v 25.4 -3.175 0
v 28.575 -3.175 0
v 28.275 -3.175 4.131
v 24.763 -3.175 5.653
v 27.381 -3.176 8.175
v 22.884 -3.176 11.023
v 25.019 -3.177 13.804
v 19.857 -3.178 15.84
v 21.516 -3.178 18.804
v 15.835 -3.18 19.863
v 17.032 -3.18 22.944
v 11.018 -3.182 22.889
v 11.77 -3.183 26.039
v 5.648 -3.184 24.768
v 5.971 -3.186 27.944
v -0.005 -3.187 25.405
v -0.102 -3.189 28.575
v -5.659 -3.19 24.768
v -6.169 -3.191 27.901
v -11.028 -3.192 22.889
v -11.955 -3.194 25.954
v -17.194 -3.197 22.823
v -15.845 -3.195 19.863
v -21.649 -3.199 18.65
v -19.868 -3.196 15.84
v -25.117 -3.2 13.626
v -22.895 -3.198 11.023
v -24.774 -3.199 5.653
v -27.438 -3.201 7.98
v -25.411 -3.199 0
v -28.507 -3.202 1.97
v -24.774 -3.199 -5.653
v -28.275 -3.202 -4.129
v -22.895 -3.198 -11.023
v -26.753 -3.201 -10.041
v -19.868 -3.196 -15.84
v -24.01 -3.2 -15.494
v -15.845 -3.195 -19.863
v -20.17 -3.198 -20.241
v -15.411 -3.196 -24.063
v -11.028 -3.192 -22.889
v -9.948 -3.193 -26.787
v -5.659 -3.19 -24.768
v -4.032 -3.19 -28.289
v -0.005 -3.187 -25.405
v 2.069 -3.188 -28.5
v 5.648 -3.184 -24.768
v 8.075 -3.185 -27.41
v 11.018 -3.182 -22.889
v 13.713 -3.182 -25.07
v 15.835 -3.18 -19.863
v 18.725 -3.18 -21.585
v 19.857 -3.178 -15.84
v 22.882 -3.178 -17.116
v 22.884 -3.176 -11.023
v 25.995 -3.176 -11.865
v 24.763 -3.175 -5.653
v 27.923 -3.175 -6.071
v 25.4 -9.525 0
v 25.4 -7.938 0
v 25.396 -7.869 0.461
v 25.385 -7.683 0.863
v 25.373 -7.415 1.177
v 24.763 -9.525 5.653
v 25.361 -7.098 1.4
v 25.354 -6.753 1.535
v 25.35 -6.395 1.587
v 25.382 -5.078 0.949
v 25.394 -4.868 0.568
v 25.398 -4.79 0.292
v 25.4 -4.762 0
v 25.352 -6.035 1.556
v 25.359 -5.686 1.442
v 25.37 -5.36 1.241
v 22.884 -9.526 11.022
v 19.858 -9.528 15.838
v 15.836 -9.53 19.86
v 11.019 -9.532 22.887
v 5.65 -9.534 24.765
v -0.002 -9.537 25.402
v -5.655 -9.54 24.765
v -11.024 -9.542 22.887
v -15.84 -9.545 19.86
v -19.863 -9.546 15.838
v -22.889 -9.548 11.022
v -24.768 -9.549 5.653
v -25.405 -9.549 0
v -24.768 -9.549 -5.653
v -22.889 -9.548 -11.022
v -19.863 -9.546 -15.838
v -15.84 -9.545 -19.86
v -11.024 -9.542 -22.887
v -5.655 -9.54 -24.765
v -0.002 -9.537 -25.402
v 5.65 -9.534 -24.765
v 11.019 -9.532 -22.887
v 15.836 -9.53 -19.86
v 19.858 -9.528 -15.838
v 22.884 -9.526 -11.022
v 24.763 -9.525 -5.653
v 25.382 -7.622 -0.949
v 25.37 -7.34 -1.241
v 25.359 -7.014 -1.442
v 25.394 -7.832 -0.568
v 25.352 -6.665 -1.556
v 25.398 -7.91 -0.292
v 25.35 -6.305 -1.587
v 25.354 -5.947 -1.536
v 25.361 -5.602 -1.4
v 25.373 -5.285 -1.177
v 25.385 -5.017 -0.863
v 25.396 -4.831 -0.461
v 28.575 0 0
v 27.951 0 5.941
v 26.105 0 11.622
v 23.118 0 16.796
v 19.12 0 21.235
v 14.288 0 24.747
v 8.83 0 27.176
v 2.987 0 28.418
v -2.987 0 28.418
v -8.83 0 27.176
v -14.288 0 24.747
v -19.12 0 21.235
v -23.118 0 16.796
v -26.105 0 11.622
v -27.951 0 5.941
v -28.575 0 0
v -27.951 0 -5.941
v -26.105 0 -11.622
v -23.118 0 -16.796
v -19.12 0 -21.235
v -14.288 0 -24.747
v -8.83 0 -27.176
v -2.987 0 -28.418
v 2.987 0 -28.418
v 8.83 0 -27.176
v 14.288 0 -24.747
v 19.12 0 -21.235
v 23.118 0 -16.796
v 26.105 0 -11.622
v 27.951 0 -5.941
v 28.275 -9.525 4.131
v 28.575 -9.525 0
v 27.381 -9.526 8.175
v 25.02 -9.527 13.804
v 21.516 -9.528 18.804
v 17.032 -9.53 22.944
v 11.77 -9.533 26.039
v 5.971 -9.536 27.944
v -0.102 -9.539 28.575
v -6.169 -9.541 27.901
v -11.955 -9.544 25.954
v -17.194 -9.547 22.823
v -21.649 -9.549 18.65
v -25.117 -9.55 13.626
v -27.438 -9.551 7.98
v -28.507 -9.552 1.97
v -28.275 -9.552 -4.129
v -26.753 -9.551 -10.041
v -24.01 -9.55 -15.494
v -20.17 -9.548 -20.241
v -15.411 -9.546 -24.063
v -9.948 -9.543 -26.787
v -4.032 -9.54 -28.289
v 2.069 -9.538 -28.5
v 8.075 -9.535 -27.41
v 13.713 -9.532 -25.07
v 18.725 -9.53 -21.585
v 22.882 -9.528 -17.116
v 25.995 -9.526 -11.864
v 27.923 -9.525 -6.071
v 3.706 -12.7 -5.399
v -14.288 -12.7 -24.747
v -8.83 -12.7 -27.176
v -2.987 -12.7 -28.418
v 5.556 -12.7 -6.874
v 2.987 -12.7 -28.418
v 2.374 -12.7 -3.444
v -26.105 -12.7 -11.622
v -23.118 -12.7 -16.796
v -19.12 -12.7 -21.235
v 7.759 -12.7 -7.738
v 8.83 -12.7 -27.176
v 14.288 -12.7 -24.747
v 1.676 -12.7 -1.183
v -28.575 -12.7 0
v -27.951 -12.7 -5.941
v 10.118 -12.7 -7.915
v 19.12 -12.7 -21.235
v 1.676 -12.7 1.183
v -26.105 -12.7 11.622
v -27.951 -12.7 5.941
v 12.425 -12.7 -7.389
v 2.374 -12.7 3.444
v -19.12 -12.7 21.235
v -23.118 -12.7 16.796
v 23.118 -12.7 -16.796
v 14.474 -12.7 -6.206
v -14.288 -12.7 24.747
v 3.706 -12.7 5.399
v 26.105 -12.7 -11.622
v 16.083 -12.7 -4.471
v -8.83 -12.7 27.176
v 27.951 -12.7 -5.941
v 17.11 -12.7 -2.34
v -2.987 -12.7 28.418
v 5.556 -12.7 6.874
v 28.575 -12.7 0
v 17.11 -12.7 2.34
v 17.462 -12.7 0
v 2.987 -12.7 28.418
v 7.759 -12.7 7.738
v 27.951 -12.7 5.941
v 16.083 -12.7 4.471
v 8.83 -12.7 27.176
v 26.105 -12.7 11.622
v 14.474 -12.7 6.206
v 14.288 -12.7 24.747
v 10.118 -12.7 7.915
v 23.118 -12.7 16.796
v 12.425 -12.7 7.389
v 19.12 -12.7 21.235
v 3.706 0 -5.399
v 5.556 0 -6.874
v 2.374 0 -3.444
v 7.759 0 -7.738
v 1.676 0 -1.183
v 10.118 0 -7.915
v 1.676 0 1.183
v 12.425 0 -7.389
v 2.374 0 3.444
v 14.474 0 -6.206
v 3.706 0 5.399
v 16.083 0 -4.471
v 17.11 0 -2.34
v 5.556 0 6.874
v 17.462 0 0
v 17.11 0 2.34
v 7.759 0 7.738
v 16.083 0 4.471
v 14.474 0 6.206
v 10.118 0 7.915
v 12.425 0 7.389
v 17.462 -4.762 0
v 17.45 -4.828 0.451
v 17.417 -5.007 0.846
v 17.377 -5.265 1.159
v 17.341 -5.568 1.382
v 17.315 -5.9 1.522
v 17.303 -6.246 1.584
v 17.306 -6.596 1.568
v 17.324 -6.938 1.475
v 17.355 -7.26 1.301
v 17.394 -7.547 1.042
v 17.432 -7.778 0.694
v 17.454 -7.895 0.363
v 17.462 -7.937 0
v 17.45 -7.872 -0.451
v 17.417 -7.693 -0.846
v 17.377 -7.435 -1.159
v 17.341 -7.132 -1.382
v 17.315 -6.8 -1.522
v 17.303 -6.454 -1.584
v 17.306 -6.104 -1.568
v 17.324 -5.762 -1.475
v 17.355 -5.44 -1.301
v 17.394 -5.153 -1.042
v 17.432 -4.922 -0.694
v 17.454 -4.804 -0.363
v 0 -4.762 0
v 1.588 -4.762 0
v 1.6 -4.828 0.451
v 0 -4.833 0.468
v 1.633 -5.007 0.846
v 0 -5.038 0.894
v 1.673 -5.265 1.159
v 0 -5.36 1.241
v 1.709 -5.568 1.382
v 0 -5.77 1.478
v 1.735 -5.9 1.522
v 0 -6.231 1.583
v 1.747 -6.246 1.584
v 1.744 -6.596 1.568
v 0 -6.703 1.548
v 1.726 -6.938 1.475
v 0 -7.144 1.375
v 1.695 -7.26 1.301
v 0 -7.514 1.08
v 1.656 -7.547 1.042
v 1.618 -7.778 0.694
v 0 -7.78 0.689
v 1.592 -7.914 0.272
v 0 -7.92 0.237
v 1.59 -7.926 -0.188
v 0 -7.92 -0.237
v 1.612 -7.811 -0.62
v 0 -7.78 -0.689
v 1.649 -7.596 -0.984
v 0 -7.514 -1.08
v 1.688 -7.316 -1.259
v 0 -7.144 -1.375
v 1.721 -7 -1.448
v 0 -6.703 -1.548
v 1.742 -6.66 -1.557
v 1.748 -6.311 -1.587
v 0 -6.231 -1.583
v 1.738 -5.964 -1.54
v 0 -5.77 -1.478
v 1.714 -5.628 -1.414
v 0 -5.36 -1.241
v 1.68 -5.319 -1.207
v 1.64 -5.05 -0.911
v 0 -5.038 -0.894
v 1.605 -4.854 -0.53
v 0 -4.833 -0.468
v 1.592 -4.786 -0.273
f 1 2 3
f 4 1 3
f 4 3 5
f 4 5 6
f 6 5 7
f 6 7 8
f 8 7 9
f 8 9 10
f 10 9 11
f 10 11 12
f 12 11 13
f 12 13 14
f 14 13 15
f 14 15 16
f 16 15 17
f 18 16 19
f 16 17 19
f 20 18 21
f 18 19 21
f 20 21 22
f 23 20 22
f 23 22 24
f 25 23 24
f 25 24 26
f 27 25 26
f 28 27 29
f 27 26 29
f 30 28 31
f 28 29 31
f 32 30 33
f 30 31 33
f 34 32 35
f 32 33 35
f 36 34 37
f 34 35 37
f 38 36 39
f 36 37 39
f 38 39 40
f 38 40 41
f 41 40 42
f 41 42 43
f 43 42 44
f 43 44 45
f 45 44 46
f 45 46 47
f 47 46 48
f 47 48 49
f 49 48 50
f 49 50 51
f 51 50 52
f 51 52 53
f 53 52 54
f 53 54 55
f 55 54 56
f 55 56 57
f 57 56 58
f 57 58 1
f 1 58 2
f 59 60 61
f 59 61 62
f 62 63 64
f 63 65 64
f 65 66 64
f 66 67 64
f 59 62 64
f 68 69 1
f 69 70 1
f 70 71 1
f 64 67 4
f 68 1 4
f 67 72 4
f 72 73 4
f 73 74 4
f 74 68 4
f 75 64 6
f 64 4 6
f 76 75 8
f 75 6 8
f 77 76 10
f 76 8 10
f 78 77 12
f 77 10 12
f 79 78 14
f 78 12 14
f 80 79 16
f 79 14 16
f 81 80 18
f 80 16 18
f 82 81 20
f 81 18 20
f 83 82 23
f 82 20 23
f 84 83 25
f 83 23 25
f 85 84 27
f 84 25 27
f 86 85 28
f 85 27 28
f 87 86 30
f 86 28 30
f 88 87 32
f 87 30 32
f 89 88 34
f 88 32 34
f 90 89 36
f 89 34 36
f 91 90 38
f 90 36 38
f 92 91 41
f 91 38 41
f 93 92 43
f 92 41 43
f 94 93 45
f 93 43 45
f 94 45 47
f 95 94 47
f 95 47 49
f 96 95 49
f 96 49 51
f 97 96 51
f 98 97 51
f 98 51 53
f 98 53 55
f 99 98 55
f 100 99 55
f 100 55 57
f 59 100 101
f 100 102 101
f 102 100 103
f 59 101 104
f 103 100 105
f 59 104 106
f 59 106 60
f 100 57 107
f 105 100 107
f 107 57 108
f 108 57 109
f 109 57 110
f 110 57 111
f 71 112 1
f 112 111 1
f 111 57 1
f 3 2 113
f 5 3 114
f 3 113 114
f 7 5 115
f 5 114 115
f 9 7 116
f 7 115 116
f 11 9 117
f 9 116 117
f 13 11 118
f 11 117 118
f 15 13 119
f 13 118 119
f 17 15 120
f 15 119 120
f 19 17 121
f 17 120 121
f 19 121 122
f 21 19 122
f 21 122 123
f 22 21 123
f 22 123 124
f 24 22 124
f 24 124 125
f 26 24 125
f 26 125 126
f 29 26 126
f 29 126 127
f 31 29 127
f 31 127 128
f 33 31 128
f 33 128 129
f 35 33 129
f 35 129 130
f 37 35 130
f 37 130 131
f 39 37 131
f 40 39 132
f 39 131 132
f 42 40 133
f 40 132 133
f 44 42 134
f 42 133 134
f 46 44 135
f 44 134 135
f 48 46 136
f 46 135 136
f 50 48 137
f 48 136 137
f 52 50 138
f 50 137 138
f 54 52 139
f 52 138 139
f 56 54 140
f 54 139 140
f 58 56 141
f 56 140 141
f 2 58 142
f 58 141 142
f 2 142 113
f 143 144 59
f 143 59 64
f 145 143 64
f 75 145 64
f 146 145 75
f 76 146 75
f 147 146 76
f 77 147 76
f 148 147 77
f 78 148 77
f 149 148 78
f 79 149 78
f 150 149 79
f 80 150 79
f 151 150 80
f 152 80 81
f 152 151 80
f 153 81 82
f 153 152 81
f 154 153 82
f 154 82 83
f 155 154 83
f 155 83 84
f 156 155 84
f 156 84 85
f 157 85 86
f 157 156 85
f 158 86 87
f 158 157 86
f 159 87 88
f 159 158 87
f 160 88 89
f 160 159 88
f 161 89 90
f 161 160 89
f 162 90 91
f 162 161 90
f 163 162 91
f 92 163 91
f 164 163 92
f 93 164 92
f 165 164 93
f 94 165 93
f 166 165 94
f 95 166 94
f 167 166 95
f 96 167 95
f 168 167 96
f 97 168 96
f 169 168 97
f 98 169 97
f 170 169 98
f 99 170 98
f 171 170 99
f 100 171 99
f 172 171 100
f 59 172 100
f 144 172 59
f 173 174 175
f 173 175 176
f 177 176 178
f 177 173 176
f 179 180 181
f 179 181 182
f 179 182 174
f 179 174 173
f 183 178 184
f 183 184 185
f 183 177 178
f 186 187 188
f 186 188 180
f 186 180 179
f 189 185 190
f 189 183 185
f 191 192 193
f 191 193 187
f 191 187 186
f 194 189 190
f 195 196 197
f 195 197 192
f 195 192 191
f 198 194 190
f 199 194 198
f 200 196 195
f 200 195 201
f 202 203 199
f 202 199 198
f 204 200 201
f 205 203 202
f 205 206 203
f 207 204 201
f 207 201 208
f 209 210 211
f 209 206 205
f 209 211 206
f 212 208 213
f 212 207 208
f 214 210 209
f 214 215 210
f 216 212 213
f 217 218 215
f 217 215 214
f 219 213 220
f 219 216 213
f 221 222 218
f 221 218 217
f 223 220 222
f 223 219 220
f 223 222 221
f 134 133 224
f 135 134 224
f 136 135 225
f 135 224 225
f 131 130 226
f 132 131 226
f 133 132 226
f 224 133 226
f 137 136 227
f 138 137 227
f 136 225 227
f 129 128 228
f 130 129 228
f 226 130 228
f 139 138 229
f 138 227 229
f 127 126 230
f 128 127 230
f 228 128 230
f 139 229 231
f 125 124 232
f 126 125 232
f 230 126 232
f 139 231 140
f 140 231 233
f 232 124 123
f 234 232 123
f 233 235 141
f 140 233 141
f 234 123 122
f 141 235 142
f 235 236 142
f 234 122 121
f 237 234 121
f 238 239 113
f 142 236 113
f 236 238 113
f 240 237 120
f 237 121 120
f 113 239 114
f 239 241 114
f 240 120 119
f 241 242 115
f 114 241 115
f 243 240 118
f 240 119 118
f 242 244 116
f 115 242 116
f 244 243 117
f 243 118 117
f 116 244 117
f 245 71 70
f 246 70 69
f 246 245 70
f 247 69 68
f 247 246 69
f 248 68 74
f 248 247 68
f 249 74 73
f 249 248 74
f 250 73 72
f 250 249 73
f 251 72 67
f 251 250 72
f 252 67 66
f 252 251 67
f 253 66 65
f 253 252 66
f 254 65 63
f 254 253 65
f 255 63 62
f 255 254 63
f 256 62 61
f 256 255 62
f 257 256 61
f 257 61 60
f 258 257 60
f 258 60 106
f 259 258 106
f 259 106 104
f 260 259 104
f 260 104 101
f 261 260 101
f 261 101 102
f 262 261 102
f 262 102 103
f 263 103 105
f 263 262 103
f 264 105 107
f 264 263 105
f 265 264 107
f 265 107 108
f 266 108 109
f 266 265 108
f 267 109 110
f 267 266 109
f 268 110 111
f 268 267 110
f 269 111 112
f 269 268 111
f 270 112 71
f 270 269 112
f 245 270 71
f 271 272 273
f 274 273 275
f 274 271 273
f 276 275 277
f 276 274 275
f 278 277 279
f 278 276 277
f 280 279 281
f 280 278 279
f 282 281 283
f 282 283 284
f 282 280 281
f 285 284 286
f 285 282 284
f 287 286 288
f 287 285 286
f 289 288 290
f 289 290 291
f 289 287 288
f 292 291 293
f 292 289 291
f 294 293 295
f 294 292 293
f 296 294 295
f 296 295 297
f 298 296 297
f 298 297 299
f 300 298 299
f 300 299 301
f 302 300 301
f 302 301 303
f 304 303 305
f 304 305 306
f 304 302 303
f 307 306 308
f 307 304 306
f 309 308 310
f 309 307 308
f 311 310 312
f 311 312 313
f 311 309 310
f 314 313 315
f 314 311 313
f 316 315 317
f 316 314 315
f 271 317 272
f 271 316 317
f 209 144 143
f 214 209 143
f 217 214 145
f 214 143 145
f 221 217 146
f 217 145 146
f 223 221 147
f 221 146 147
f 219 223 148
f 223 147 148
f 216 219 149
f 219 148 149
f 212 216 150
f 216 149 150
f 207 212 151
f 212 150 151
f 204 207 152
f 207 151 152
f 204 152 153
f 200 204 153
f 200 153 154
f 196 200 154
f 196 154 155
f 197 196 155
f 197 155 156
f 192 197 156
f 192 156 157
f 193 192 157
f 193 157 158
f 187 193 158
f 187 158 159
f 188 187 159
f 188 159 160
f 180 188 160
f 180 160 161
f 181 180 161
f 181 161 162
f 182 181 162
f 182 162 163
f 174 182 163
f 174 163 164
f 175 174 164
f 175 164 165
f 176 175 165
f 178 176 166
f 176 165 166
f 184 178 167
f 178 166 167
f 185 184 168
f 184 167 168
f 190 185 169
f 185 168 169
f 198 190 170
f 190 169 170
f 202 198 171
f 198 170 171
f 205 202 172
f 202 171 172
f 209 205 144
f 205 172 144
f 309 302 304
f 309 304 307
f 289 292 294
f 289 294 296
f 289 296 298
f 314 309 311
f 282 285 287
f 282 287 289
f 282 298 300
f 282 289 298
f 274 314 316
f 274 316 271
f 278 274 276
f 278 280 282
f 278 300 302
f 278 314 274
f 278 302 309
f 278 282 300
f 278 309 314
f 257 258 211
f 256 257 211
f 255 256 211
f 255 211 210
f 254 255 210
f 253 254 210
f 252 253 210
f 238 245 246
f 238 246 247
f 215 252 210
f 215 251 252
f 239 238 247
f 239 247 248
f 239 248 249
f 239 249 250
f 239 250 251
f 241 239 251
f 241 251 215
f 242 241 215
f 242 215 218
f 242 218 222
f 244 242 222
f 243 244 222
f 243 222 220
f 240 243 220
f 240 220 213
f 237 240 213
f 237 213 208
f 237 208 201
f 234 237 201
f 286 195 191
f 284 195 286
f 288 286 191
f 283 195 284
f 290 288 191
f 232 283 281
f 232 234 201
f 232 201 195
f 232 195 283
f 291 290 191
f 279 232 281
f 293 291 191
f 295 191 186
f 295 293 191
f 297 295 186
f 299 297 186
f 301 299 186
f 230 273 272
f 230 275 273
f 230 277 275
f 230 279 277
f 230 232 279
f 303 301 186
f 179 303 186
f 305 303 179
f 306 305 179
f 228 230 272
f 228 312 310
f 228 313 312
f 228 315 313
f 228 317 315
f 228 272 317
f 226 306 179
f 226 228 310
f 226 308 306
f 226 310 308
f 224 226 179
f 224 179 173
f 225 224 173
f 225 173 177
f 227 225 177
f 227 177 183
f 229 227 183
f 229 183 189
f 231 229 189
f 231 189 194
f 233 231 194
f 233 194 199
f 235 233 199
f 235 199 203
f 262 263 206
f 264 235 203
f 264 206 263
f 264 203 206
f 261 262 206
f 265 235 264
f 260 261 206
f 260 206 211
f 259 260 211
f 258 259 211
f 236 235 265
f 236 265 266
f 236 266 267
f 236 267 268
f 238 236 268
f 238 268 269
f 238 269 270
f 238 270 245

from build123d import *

# Parameters (mm, degrees)
F0_R     = 28.575
F0_R_2   = 7.9375
F1_DEPTH = 12.7
F2_W     = 3.175
F2_H     = 6.35
F5_R     = 1.5875
F6_DEPTH = 25.4


with BuildPart() as f1:
    # F0 (on Front) → F1 (new body)
    with BuildSketch(Plane.XZ):
        Circle(F0_R)
        with Locations((9.525, 0)):
            Circle(F0_R_2, mode=Mode.SUBTRACT)
    extrude(amount=F1_DEPTH)

    # F2 (on Top) → F4 (revolve, cut)
    with BuildSketch(Plane.XY):
        with Locations((26.9875, -6.35)):
            Rectangle(F2_W, F2_H)
    revolve(axis=Axis((-0.004353, -5.31878, 0), (0.000473, -1, 0)), mode=Mode.SUBTRACT)

    # F5 (on Right) → F6 (cut)
    with BuildSketch(Plane.YZ):
        with Locations((-6.35, 0)):
            Circle(F5_R)
    extrude(amount=F6_DEPTH, mode=Mode.SUBTRACT)


solid = f1.part
